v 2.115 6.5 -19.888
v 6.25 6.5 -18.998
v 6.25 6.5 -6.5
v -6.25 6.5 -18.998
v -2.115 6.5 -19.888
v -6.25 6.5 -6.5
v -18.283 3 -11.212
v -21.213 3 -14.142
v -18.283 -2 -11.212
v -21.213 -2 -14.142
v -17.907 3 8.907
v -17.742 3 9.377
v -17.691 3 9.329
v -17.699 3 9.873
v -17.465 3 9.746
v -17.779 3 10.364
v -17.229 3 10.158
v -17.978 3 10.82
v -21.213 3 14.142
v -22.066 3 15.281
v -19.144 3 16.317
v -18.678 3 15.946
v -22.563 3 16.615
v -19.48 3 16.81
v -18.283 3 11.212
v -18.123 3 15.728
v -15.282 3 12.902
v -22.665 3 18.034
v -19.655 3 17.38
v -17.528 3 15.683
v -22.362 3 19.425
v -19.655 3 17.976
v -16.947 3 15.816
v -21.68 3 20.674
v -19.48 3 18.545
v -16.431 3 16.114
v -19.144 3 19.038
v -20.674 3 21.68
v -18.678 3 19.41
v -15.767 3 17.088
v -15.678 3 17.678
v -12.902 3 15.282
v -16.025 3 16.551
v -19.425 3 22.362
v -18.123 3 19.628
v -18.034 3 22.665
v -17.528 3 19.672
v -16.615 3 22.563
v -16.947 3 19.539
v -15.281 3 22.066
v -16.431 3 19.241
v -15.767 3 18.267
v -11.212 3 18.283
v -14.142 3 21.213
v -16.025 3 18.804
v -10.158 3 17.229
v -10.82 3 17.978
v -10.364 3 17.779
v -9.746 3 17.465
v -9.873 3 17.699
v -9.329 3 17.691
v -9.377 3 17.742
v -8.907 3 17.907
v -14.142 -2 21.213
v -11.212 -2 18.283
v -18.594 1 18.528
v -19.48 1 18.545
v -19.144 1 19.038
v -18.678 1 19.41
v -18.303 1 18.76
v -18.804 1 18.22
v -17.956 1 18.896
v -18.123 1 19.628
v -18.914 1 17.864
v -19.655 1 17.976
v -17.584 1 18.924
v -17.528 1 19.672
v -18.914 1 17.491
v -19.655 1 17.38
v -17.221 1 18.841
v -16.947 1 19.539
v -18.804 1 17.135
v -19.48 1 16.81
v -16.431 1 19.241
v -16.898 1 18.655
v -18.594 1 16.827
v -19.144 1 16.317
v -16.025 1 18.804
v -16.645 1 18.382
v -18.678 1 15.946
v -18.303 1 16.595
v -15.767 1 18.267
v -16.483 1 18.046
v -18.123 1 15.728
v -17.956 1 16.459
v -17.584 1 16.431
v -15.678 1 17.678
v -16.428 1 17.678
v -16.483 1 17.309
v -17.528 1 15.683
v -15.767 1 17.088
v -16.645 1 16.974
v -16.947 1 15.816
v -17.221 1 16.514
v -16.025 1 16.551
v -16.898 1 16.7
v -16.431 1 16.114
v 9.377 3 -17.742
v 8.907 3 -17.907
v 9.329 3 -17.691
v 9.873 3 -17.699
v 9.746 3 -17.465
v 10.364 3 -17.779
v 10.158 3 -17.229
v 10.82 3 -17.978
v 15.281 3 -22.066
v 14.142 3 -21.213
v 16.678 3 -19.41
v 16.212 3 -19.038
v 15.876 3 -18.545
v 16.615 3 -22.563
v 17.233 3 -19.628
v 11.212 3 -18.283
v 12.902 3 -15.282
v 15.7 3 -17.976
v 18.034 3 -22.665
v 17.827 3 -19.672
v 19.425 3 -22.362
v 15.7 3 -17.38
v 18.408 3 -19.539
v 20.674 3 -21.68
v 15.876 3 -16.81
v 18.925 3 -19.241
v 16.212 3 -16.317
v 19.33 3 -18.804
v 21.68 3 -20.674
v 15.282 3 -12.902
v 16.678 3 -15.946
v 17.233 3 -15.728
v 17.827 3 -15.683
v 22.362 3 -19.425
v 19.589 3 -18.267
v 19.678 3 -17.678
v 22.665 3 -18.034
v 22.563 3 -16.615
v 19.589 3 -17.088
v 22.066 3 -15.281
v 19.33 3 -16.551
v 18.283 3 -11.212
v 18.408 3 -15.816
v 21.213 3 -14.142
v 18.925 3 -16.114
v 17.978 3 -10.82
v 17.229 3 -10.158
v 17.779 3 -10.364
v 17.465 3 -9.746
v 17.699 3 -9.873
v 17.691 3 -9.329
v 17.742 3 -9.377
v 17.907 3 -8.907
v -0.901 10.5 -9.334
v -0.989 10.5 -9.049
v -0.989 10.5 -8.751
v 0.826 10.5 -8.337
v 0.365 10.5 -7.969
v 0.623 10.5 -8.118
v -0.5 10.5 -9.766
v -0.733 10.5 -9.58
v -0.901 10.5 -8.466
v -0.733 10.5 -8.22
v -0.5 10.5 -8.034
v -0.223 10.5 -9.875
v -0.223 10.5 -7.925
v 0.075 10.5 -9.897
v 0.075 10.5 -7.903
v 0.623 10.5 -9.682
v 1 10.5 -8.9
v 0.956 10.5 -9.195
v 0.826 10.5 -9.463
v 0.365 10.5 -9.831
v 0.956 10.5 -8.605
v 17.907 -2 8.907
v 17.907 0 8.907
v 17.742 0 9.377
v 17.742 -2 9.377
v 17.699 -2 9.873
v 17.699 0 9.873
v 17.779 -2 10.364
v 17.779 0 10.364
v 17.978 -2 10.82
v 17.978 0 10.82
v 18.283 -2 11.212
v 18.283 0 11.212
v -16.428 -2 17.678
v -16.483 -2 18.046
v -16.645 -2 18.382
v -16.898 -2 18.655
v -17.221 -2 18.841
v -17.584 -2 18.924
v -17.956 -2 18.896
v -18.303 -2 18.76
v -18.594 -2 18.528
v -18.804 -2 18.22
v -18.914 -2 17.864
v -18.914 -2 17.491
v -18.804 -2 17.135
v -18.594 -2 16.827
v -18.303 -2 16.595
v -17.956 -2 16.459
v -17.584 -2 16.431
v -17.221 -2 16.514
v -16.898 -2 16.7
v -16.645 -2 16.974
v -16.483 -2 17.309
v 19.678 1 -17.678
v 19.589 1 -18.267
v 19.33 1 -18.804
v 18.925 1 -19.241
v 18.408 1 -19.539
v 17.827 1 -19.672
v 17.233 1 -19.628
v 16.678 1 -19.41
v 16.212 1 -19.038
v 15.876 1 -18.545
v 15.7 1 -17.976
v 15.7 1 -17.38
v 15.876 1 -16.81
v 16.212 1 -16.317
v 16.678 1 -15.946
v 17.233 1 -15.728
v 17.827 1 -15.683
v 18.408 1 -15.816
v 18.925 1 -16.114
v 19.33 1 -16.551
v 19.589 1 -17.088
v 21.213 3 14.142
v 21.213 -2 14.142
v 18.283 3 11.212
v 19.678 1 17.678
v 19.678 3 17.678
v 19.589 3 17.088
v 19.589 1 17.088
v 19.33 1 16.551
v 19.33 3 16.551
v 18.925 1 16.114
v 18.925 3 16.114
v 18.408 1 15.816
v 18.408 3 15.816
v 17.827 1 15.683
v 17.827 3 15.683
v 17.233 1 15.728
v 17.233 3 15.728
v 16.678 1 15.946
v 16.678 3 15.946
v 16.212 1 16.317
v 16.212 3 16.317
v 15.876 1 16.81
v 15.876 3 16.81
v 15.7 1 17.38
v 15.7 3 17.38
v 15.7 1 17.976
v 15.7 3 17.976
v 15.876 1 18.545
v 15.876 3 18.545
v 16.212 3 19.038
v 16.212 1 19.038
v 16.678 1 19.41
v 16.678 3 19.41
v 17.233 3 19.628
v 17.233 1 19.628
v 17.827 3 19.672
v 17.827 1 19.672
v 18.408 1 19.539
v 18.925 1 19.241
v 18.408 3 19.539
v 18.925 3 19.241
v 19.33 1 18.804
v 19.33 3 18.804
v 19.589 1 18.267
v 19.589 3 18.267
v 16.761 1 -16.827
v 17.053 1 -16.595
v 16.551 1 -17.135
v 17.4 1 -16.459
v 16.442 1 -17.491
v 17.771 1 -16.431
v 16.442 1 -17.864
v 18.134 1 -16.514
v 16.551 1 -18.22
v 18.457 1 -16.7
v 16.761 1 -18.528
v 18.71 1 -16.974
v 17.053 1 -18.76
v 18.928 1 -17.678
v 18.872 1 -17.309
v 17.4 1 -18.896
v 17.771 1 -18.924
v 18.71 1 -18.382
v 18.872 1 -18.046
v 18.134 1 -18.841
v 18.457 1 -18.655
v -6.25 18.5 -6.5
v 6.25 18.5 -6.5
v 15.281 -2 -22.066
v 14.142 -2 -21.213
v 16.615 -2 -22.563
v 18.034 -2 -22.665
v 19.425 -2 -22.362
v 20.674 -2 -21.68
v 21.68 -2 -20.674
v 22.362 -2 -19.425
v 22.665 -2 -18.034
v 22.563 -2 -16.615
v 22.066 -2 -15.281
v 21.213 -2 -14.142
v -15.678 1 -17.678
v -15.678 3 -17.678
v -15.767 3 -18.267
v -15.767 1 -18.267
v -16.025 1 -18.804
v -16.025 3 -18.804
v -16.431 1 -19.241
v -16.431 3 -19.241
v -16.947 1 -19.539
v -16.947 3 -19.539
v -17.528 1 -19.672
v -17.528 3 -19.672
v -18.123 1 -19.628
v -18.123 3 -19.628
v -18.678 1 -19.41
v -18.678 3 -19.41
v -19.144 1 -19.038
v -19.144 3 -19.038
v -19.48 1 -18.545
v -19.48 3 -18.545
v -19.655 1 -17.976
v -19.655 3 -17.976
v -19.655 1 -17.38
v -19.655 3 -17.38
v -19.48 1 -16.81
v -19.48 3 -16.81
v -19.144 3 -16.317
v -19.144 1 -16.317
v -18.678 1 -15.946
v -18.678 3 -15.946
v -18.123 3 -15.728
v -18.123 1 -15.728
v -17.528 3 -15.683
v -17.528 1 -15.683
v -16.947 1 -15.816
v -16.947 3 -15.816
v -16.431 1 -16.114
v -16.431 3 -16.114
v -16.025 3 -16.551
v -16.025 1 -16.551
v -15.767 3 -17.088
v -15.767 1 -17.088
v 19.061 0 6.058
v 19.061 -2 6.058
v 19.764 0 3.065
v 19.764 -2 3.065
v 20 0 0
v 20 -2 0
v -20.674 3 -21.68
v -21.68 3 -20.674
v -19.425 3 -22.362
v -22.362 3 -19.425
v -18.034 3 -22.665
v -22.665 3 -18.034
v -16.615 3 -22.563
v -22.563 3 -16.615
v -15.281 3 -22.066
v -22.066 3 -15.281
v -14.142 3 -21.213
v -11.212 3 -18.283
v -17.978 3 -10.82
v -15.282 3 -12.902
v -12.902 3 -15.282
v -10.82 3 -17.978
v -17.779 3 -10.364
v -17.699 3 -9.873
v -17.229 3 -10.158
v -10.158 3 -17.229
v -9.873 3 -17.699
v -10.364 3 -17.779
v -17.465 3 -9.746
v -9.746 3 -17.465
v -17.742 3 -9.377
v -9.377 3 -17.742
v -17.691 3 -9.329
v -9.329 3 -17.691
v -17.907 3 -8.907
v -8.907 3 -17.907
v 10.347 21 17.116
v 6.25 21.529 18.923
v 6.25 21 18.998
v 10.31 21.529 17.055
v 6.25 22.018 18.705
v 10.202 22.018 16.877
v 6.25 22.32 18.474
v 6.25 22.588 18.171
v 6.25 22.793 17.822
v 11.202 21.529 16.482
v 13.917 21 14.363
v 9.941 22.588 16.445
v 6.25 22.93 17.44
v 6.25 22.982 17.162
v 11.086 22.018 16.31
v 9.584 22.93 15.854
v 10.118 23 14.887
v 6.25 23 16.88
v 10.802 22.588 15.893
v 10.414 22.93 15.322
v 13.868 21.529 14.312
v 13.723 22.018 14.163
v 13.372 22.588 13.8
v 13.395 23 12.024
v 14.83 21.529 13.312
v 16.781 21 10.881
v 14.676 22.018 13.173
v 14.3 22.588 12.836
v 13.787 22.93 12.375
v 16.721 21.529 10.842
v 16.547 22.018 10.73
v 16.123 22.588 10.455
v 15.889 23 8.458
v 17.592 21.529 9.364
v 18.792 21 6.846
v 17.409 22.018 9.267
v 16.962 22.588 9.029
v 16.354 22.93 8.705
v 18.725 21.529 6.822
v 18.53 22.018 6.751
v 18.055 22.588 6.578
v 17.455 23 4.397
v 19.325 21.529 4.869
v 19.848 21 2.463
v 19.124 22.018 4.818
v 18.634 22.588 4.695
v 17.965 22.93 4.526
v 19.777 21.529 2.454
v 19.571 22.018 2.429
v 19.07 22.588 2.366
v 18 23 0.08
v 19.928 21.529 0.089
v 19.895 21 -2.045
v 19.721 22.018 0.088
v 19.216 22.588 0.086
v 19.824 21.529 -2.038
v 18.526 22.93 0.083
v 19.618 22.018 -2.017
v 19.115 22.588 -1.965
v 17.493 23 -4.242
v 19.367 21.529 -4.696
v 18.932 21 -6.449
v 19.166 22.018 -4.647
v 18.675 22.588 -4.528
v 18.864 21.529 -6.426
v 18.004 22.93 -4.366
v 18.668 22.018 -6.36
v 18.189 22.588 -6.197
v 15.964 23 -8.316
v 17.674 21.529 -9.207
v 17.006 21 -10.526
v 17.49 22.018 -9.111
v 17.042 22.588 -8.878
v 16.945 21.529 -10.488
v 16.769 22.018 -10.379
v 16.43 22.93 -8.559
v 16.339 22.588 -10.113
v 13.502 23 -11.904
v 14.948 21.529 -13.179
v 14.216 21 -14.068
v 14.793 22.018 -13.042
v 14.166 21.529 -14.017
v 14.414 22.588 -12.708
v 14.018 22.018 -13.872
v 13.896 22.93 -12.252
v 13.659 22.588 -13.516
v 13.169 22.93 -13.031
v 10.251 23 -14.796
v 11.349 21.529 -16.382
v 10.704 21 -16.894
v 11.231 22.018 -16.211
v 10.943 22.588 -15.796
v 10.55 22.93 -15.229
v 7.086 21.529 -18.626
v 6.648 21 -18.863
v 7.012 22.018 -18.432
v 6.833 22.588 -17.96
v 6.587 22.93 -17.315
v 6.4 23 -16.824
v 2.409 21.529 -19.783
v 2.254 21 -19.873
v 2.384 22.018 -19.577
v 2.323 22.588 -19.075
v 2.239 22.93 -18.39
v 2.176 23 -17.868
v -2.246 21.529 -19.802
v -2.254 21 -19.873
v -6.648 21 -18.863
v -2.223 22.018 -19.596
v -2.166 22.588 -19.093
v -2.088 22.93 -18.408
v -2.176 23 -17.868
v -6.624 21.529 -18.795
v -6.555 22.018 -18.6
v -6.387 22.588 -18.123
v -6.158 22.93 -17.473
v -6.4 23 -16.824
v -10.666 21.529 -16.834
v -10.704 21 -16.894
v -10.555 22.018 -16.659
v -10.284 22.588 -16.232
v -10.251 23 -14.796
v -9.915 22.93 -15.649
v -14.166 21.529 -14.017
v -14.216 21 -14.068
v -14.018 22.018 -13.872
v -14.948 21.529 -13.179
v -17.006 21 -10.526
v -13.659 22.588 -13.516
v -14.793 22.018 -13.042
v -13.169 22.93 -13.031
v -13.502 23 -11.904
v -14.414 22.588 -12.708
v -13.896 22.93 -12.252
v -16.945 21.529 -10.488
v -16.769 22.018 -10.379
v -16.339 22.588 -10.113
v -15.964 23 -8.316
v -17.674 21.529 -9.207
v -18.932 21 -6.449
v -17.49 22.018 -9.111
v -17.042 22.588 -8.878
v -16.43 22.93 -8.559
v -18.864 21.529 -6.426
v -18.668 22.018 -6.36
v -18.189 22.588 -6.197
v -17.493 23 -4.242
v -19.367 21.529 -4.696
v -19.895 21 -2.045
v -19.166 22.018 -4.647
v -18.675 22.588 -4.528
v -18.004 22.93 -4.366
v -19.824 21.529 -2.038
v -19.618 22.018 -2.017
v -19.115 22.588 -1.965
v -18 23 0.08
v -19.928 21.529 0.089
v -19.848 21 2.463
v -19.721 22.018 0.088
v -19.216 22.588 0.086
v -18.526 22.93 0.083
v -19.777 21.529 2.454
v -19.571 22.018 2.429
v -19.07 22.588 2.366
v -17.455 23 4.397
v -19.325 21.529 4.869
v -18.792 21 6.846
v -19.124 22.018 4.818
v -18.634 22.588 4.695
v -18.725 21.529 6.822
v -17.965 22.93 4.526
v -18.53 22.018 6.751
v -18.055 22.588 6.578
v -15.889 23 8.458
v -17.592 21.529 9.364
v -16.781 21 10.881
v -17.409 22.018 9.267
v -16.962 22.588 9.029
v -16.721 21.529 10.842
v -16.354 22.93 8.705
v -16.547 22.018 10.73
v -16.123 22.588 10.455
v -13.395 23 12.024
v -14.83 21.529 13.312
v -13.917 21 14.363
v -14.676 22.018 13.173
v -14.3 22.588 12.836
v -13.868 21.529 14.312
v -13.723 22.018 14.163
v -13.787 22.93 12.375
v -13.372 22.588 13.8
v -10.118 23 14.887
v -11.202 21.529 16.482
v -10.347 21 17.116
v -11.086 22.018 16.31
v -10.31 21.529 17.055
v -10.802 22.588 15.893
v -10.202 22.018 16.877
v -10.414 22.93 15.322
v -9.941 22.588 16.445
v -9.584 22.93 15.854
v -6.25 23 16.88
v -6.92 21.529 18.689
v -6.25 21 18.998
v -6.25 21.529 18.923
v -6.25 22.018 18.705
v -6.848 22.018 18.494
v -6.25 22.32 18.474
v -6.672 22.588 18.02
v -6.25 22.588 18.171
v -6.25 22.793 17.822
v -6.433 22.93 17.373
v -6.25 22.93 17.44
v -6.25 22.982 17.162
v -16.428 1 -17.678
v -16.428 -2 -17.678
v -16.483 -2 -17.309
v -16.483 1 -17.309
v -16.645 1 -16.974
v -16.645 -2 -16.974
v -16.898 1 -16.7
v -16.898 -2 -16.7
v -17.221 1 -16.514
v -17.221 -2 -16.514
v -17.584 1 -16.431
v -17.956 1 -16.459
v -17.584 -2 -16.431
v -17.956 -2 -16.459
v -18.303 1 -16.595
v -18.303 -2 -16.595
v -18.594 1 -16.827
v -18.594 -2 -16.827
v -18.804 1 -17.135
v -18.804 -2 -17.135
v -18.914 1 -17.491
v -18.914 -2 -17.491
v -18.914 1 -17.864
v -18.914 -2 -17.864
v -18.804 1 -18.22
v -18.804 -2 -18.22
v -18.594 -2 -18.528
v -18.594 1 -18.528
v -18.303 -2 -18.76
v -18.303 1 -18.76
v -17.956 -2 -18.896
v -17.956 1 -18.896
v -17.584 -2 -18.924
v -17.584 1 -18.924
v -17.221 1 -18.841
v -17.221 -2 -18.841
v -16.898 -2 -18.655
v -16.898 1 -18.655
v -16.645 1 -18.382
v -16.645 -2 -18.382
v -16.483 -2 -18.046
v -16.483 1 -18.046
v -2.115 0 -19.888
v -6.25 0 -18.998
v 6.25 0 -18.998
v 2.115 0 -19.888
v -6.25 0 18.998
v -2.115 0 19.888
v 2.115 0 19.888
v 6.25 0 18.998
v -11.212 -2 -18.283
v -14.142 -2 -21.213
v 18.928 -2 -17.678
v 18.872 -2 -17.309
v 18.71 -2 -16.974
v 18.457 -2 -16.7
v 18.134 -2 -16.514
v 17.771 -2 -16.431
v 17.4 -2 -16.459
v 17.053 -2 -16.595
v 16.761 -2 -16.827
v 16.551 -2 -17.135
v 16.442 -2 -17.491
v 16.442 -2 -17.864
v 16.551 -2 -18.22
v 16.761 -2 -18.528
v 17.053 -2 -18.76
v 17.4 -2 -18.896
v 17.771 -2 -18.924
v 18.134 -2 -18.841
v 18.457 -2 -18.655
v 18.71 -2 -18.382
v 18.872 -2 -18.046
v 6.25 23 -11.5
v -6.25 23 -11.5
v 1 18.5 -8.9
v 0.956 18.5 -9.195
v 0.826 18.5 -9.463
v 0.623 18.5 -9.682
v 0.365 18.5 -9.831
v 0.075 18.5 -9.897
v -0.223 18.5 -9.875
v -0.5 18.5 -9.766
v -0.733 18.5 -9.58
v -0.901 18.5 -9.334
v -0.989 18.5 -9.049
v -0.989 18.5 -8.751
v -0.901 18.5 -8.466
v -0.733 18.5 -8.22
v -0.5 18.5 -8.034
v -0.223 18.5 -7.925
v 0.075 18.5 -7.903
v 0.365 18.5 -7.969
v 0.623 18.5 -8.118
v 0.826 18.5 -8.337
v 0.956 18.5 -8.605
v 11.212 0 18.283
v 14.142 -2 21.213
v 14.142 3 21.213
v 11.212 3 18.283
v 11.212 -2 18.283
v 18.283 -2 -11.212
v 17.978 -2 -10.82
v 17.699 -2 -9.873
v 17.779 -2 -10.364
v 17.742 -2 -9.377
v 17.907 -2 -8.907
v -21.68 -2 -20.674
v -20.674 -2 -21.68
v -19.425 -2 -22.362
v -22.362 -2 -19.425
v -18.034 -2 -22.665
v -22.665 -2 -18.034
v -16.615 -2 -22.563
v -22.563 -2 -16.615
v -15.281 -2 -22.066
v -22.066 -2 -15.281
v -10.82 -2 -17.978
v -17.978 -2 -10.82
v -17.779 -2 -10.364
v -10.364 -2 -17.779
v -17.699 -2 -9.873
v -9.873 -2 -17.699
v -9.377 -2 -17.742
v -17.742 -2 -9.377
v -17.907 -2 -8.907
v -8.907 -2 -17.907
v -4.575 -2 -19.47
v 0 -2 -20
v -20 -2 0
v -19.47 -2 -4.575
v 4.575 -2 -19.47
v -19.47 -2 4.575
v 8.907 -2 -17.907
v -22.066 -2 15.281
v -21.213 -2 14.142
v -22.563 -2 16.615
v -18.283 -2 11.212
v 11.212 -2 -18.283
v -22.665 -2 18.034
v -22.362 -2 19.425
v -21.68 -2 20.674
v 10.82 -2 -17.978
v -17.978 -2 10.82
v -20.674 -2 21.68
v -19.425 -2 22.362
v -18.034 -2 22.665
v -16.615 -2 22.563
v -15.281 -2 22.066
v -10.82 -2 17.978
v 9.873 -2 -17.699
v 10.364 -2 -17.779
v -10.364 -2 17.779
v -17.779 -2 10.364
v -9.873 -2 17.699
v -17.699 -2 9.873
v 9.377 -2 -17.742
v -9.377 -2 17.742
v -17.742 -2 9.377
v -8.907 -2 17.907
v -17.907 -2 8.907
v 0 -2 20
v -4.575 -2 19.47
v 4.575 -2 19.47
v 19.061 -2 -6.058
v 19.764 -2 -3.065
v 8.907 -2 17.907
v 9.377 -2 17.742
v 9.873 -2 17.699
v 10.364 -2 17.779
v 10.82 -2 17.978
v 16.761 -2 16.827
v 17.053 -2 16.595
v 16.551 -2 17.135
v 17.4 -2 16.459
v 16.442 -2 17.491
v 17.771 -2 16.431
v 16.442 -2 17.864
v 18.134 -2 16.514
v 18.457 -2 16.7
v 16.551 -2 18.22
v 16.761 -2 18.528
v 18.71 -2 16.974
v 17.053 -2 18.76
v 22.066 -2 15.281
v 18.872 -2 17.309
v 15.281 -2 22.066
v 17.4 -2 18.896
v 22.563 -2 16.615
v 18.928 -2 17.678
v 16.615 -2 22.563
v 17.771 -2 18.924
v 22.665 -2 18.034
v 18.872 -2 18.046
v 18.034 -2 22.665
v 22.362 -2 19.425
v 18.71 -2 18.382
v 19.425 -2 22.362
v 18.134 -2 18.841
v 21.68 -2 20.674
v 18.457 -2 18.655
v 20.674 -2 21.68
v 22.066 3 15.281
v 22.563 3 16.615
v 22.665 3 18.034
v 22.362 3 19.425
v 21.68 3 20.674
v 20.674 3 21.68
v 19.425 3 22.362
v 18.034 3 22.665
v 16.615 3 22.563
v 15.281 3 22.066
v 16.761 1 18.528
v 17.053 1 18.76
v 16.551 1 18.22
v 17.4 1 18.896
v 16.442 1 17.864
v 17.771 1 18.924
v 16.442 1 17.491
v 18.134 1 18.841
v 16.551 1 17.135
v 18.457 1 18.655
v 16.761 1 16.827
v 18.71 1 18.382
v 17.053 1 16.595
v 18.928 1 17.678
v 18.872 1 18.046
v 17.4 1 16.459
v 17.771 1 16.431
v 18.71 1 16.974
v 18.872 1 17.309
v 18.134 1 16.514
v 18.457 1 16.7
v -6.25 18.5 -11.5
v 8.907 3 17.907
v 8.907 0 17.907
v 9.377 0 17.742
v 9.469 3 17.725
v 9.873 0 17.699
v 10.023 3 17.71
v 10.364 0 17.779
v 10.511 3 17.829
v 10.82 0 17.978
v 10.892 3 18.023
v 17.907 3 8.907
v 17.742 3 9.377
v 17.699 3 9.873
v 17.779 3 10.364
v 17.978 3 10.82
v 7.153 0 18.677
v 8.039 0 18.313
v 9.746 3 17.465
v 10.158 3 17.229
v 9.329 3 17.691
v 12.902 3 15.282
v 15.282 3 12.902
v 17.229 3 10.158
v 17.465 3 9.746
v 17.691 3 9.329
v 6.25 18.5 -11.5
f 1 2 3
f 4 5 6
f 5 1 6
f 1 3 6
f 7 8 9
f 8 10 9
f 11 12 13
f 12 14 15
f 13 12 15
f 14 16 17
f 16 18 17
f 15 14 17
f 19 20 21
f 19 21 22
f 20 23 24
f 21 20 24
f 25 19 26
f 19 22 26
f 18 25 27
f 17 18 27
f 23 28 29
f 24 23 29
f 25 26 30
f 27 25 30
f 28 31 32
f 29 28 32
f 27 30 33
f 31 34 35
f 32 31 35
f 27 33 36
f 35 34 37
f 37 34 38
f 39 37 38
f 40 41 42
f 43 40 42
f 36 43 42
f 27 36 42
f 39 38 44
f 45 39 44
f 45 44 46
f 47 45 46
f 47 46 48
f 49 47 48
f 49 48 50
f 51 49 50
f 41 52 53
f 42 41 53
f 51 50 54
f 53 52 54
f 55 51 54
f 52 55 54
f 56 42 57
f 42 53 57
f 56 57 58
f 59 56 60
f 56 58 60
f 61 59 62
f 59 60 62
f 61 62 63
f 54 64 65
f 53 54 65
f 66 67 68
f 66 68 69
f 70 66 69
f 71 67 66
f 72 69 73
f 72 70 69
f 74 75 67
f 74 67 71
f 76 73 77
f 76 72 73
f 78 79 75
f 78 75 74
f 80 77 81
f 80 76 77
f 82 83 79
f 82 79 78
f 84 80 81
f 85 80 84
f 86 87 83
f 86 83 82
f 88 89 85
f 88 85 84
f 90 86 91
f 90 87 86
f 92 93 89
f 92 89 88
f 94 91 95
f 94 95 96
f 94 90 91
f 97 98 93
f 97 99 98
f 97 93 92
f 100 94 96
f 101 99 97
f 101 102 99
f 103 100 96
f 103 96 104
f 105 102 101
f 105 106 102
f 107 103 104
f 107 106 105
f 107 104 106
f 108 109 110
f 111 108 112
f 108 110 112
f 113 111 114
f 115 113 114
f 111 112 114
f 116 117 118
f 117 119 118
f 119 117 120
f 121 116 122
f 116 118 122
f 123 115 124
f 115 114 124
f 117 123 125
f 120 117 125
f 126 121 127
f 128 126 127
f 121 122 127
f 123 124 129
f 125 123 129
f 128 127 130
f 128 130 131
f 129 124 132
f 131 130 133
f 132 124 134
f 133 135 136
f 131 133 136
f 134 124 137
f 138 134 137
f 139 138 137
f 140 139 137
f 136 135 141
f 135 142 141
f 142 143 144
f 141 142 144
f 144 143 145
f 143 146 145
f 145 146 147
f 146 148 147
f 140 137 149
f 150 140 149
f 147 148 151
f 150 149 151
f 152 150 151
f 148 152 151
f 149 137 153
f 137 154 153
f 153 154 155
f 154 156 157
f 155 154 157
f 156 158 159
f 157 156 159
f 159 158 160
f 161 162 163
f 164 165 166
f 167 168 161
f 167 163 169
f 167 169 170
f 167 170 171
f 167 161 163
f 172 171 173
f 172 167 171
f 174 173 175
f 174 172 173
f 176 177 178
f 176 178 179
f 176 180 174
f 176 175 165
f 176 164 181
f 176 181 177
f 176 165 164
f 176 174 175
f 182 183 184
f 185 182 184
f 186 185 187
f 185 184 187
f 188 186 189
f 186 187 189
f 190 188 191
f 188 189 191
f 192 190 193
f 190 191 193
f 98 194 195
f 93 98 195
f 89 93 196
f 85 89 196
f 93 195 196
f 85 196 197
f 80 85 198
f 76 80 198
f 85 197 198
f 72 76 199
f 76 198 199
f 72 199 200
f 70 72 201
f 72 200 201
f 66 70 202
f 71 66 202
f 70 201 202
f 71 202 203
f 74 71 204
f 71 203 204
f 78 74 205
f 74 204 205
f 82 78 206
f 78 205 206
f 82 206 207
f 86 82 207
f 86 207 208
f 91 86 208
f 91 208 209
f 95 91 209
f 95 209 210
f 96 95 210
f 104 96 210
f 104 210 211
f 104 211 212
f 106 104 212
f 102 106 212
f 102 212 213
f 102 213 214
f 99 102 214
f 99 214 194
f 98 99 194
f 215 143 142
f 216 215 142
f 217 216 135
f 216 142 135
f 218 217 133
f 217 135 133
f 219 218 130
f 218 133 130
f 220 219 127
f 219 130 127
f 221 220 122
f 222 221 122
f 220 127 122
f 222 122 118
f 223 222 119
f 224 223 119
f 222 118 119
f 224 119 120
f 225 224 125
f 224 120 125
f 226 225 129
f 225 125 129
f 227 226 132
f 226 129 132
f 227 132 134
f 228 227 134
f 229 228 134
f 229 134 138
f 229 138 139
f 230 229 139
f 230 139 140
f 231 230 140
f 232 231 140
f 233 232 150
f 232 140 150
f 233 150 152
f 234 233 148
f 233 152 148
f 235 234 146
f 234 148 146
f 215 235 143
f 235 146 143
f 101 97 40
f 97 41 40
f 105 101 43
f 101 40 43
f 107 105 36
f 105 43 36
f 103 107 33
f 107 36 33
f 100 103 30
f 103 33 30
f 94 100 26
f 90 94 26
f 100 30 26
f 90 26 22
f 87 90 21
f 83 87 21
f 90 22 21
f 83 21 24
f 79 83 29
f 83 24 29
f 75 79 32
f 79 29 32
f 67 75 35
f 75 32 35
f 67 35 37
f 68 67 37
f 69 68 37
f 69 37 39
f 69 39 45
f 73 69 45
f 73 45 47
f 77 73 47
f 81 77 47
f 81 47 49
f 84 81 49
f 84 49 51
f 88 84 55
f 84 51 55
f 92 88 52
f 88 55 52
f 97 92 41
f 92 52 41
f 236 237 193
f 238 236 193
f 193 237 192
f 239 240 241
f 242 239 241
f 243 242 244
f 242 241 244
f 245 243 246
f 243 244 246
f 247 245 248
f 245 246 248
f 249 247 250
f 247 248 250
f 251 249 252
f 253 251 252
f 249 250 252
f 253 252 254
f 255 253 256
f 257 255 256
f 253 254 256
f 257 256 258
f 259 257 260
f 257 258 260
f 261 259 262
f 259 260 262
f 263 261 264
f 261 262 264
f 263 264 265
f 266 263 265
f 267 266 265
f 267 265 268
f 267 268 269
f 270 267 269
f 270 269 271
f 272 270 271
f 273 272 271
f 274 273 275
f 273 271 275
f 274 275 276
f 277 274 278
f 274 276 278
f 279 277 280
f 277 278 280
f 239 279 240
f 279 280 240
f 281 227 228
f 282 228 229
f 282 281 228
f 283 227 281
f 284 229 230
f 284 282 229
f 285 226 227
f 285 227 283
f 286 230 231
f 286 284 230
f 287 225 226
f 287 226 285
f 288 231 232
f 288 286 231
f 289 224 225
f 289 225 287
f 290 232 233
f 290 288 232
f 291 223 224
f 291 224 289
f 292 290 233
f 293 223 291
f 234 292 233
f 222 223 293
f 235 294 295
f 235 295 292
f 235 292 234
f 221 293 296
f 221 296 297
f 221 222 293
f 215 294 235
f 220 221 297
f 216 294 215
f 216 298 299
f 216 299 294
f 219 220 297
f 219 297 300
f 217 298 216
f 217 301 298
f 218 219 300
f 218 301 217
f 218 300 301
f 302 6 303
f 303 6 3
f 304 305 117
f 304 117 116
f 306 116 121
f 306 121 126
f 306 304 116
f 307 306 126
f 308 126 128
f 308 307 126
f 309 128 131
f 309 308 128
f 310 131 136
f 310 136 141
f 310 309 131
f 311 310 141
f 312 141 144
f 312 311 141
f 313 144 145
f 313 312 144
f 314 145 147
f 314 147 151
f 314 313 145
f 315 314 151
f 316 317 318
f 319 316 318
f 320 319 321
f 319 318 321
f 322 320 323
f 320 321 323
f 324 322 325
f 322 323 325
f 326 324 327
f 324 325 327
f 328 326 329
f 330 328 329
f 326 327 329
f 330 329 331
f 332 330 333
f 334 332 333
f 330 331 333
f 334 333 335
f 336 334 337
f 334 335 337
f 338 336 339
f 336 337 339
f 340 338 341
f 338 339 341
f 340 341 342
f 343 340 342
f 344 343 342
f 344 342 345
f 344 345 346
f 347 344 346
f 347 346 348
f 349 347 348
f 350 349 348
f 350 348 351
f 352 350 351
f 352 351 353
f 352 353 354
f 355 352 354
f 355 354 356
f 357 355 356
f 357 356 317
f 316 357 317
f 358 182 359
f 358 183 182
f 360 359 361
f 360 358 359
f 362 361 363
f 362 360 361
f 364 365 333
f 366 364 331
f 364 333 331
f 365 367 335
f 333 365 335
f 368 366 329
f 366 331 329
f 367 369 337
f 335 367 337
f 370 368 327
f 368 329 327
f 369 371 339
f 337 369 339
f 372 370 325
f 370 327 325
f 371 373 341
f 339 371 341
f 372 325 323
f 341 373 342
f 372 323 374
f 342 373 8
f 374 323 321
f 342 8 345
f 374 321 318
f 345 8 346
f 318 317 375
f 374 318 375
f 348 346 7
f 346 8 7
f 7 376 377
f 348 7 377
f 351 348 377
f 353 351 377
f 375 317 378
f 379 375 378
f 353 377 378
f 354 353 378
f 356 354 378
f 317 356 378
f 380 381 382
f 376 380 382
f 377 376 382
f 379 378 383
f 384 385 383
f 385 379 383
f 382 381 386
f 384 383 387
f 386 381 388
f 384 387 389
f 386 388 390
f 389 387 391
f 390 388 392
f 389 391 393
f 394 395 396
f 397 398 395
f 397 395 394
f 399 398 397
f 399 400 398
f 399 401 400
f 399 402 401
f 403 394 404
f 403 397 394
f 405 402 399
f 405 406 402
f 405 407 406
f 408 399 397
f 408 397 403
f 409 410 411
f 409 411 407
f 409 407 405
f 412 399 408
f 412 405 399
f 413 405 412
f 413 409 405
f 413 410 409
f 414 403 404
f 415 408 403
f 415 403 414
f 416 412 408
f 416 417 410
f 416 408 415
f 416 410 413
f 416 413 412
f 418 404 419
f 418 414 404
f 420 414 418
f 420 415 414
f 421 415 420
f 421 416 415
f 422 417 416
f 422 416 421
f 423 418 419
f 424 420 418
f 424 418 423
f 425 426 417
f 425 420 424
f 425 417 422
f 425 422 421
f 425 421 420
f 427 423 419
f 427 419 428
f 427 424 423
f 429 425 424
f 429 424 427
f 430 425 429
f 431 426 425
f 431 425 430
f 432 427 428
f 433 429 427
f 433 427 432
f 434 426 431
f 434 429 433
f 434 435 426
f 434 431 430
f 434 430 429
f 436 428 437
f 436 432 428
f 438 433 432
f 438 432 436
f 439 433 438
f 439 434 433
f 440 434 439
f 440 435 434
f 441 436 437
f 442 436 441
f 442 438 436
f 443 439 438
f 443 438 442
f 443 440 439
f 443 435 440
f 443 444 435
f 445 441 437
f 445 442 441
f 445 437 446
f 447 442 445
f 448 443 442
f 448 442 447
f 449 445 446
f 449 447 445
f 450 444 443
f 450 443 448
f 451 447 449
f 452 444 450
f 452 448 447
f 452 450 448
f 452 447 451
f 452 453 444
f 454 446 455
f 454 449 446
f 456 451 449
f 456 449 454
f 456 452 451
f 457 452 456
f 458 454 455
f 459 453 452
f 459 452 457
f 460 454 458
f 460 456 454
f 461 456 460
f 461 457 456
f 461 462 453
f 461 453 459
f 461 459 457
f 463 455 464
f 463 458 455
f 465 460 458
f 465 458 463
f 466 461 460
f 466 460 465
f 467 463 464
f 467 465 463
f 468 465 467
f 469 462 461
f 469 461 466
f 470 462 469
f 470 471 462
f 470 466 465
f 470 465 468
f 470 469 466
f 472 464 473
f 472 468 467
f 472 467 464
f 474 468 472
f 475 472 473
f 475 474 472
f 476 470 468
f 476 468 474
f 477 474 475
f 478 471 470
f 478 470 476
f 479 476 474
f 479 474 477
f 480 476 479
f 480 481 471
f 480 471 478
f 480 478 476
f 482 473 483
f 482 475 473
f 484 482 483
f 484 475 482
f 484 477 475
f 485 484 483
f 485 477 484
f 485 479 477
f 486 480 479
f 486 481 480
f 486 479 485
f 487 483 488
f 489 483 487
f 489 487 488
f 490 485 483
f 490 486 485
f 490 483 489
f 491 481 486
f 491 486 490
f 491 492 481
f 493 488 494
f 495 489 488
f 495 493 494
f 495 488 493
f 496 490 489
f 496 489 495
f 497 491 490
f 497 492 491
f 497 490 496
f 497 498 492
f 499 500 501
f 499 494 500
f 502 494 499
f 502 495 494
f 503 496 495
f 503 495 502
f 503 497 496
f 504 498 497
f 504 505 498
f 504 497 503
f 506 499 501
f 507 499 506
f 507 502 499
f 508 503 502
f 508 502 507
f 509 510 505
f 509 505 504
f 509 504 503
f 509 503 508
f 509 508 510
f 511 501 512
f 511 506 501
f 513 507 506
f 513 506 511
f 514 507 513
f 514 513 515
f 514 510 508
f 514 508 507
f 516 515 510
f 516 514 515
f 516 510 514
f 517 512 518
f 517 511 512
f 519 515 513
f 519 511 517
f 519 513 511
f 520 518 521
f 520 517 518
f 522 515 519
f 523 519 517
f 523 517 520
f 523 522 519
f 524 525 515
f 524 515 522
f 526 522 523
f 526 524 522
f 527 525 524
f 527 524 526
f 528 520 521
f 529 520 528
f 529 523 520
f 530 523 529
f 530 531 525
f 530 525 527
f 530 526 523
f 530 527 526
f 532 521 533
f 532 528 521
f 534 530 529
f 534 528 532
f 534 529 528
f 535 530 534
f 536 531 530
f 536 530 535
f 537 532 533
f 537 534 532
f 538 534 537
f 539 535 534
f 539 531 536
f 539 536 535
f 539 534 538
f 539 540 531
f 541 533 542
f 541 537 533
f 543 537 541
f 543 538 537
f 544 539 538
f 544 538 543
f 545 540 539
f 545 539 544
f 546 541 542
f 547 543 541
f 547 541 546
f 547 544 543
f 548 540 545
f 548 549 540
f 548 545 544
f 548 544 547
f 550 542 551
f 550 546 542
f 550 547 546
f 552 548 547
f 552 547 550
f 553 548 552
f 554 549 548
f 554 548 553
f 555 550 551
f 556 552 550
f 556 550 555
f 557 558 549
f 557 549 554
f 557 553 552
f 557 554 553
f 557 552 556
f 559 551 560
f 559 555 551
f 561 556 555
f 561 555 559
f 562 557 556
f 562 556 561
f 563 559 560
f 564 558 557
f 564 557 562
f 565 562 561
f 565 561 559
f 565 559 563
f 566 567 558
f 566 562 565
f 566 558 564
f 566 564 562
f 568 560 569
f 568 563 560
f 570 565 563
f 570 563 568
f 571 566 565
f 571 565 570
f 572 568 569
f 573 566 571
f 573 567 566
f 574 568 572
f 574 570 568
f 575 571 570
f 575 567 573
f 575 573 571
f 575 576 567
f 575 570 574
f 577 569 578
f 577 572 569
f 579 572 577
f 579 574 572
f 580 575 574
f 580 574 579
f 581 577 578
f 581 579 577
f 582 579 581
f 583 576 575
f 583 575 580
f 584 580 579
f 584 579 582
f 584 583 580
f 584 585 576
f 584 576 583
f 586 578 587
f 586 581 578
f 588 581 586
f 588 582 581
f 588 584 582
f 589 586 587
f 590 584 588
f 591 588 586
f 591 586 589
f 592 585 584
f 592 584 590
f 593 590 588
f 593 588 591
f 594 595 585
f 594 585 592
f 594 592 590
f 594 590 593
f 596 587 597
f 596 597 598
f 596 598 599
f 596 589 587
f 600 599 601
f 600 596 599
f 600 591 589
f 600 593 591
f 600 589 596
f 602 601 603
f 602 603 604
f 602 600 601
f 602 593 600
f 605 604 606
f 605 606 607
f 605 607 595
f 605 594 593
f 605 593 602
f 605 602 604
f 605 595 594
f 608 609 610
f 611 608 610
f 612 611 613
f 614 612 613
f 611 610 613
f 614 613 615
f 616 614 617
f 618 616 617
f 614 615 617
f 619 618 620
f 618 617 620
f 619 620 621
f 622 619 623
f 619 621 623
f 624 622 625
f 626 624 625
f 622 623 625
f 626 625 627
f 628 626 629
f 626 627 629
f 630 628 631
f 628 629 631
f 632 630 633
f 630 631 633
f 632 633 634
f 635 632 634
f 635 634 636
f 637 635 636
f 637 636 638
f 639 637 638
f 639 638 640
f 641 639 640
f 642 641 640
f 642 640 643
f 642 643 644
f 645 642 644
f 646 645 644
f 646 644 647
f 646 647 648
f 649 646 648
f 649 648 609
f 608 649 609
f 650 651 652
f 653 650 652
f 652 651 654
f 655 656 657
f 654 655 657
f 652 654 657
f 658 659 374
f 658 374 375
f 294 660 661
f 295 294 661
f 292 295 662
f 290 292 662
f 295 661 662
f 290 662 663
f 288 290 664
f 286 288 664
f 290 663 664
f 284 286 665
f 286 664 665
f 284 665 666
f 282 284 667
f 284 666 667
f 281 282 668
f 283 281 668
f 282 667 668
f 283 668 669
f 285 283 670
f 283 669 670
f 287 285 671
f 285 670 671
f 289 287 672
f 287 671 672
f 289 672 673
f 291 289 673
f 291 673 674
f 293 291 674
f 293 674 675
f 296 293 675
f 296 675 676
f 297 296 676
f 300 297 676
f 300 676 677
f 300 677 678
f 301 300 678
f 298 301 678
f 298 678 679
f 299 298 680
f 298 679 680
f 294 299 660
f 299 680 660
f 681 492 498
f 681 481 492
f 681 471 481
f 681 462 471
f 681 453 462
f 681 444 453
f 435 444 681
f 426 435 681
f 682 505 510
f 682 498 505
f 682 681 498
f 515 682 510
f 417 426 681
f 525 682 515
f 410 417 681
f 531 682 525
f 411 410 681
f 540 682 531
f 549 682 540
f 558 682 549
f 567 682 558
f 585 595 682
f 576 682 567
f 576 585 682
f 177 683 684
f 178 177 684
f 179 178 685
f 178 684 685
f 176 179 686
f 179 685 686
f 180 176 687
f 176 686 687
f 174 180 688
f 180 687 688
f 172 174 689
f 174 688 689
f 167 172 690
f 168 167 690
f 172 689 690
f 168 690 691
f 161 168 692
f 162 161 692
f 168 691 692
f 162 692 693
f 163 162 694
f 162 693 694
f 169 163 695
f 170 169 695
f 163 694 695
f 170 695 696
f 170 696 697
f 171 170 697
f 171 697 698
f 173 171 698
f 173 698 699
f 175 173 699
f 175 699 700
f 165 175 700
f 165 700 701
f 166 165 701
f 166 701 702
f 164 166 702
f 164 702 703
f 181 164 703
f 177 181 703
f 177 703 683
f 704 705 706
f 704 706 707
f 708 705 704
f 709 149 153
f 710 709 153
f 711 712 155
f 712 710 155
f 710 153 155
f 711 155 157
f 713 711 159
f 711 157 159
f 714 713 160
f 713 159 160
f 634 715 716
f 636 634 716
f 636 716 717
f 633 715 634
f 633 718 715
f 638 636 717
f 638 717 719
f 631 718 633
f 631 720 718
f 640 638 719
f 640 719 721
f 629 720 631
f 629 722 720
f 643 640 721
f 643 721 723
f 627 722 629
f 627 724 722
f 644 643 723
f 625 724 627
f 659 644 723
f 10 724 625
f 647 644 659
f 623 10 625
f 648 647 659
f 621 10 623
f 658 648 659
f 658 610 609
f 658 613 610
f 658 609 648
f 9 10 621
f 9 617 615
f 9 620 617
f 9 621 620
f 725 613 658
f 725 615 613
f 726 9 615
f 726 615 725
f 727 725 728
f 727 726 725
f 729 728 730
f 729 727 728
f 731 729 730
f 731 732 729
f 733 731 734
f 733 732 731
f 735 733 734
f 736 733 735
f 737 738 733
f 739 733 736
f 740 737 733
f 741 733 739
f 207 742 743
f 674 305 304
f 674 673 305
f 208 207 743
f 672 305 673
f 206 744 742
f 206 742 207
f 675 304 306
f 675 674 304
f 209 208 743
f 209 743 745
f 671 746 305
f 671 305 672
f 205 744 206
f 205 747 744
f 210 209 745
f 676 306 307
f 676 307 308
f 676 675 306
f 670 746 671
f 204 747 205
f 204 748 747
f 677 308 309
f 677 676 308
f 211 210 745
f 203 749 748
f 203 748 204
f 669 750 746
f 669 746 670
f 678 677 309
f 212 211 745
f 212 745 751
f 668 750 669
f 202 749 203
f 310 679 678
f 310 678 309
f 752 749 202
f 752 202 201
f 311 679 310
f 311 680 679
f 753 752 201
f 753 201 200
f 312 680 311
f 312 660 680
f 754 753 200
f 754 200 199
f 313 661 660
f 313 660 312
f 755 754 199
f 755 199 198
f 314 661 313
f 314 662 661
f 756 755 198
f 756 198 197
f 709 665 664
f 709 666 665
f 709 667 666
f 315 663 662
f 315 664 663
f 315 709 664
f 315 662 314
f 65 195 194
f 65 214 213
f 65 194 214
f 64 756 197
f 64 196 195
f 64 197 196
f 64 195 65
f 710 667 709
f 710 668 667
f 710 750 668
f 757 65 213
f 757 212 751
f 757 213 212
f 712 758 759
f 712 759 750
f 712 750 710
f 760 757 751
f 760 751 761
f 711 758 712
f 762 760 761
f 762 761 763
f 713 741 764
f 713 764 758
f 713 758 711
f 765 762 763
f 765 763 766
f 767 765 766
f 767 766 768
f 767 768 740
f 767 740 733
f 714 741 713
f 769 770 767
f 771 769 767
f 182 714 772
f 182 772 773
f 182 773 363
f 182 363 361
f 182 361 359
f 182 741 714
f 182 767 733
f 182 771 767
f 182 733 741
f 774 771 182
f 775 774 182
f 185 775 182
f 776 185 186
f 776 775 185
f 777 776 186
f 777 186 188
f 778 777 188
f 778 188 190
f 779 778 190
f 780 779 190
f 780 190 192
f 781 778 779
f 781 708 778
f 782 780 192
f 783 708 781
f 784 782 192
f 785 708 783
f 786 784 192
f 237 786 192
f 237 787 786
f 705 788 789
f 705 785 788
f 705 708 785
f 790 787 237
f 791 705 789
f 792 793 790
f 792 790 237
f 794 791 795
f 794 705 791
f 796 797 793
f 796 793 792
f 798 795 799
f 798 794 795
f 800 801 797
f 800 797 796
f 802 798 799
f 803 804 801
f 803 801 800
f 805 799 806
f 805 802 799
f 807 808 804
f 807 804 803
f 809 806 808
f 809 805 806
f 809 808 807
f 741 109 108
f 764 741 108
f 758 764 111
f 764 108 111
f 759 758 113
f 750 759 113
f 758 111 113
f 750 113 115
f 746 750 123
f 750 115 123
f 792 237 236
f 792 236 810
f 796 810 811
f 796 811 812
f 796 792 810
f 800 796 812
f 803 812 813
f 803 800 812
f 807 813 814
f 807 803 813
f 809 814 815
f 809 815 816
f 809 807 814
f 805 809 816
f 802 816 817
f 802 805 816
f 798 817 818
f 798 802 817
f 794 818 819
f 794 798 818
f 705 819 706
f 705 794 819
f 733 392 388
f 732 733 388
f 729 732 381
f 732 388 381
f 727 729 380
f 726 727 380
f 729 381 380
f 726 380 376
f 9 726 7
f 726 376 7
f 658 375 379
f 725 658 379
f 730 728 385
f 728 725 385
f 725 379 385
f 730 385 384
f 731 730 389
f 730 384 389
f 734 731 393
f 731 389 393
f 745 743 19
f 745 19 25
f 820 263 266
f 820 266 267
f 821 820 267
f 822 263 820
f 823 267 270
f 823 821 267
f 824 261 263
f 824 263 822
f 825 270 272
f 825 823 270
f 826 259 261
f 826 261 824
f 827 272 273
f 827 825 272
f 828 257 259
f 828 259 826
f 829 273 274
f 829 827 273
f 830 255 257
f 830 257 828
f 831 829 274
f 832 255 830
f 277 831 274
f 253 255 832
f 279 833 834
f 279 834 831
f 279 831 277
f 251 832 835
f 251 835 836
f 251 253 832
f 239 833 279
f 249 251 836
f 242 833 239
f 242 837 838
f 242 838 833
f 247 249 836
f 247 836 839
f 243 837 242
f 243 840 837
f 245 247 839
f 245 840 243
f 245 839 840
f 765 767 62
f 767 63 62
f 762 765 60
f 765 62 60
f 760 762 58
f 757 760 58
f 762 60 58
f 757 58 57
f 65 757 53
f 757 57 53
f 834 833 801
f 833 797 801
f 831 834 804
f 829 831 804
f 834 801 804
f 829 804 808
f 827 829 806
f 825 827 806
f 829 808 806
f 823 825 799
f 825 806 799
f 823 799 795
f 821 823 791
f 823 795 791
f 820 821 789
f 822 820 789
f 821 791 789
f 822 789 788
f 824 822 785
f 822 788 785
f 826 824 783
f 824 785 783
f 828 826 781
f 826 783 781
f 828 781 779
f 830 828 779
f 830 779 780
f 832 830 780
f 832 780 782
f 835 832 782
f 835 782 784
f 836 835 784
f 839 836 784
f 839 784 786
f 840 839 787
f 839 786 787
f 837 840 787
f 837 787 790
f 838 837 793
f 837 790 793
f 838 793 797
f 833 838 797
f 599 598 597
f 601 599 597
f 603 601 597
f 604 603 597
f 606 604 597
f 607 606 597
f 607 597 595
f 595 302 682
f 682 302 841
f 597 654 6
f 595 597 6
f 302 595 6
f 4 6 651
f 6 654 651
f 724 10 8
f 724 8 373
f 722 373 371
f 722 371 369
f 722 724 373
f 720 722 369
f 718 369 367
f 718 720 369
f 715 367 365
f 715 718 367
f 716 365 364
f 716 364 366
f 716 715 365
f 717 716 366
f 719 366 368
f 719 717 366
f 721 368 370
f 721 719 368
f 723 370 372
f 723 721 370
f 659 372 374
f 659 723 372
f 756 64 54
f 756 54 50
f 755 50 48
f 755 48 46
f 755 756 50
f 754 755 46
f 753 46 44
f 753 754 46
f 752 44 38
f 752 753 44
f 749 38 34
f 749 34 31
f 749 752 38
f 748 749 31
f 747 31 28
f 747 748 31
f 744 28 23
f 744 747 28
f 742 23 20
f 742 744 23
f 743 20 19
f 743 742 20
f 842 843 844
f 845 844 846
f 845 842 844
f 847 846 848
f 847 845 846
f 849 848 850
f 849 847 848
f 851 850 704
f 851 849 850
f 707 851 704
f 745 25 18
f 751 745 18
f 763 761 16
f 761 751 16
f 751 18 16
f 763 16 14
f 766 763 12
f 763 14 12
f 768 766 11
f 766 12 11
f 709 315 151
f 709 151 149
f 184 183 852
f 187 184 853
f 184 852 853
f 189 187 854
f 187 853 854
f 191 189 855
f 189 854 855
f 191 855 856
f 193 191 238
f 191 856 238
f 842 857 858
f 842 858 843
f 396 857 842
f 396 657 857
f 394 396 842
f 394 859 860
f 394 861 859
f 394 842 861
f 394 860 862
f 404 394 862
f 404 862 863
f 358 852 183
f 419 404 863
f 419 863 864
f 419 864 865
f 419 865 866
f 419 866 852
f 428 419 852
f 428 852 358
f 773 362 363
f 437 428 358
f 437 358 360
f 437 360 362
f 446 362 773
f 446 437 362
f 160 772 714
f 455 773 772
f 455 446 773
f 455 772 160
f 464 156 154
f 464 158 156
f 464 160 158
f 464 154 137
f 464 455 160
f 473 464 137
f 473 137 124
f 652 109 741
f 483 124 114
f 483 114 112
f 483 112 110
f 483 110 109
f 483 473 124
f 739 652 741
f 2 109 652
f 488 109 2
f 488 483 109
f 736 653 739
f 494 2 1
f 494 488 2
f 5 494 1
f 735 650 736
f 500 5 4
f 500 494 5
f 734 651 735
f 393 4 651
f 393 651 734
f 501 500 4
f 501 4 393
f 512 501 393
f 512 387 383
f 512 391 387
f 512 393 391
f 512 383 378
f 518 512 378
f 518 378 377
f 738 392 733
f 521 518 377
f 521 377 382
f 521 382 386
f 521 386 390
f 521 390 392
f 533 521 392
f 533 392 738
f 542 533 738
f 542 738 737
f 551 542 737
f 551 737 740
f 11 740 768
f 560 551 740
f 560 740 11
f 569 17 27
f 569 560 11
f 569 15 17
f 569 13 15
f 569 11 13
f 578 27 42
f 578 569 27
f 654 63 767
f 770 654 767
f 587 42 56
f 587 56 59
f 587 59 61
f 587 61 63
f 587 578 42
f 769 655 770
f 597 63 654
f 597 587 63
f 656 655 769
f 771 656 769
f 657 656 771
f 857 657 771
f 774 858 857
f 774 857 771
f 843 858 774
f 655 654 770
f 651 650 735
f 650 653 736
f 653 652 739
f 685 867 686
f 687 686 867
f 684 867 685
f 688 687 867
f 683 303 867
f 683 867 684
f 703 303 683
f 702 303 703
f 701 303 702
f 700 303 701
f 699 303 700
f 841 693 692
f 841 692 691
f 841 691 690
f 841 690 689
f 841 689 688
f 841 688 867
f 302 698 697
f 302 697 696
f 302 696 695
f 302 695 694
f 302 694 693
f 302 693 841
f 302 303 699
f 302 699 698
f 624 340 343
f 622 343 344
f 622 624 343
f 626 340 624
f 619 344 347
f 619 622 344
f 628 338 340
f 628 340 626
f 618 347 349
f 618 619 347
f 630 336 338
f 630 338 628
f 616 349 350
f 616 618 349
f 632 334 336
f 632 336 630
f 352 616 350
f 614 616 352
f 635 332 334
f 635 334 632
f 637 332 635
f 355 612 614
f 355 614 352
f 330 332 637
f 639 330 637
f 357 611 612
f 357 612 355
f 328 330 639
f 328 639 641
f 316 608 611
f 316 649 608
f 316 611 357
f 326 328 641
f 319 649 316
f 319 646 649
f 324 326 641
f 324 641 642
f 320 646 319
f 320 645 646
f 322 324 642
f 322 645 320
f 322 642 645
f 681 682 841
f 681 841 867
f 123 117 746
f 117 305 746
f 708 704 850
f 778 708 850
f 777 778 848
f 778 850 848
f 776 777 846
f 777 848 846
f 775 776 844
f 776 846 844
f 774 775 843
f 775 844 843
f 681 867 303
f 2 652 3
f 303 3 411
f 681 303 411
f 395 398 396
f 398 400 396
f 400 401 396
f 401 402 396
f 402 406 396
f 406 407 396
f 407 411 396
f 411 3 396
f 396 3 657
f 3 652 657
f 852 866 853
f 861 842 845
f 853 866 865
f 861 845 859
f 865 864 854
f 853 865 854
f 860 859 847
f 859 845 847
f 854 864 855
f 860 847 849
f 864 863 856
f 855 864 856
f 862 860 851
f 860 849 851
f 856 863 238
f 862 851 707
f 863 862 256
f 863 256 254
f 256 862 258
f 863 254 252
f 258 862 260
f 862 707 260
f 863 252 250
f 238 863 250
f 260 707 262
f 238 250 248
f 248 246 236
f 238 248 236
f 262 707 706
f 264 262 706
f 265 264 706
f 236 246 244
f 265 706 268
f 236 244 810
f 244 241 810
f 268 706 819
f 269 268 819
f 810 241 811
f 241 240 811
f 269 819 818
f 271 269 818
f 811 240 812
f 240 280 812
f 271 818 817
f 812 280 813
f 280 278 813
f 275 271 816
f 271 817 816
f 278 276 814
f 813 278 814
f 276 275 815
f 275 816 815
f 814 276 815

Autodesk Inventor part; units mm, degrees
ref_plane "YZ Plane" through (0, 0, 0) normal (1, 0, 0) x (0, 1, 0)
ref_plane "XZ Plane" through (0, 0, 0) normal (0, 1, 0) x (-1, 0, 0)
ref_plane "XY Plane" through (0, 0, 0) normal (0, 0, 1) x (1, 0, 0)
sketch "Sketch2" plane through (0, 0, 0) normal (0, 1, 0) x (-1, 0, 0)
  circle A0 centre (0, 0) radius 20
  line L0 (6.25, -6.5) -> (-6.25, -6.5)
  line L1 (-6.25, -6.5) -> (-6.25, 22.6664)
  line L2 (-6.25, 22.6664) -> (6.25, 22.6664)
  line L3 (6.25, 22.6664) -> (6.25, -6.5)
  line L4 (0, -28.5333) -> (0, 31.1997) projected
  line L5 (28, 0) -> (-28, 0) projected
  point P0 (0, -6.5)
  point P1 (6.25, 18.9984)
  point P2 (-6.25, 18.9984)
  dimension "d5" = 40
  dimension "d6" = 6.5
  dimension "d7" = 12.5
extrude "Extrusion1" add sketch "Sketch2" along normal blind 23 contours L5 L3 A0 | A0 L4 L0 L3 L5 | A0 L5 L1 L0 L4 | A0 L1 L5
sketch "Sketch3" plane through (-6.25, 0, -6.5) normal (0, 0, 1) x (1, 0, 0)
  line L0 (0, 23) -> (12.5, 23) projected
  line L1 (0, 23) -> (12.5, 23)
  line L2 (12.5, 23) -> (12.5, 18.5)
  line L3 (12.5, 18.5) -> (0, 18.5)
  line L4 (0, 18.5) -> (0, 23)
  point P0 (0, 0)
  dimension "d10" = 4.5
extrude "Extrusion2" cut sketch "Sketch3" against normal blind 5
sketch "Sketch4" plane through (-6.25, 0, -6.5) normal (0, 0, 1) x (1, 0, 0)
  line L0 (0, 23) -> (12.5, 23)
  line L1 (12.5, 23) -> (12.5, 18.5)
  line L2 (12.5, 18.5) -> (0, 18.5)
  line L3 (0, 18.5) -> (0, 23)
  line L4 (0, 0) -> (10.5075, 0)
  line L5 (0, 0) -> (12.5, 0)
  line L6 (12.5, 0) -> (12.5, 6.5)
  line L7 (12.5, 6.5) -> (0, 6.5)
  line L8 (0, 6.5) -> (0, 0)
  point P0 (6.25, 0)
  point P1 (6.25, 0)
  dimension "d16" = 12
extrude "Extrusion3" cut sketch "Sketch4" against normal up to surface contours L8 L7 L6 L5 L4
sketch "Sketch5" plane through (-6.25, 18.5, -6.5) normal (0, 1, 0) x (1, 0, 0)
  line L0 (12.5, -25.4984) -> (12.5, 12.4984) projected
  line L1 (0, 0) -> (0, 12.4984) projected
  line L2 (0, 0) -> (6.25, 0)
  line L3 (6.25, 0) -> (6.25, 2.4)
  line L4 (6.25, 2.4) -> (0, 2.4)
  line L5 (0, 2.4) -> (0, 0)
  line L6 (12.5, 0) -> (0, 0) projected
  circle A0 centre (6.25, 2.4) radius 1
  point P0 (6.25, -6.5)
  point P1 (12.6412, 0)
  point P2 (12.5, 12.4984)
  dimension "d20" = 2.4
  dimension "d21" = 2
extrude "Extrusion4" cut sketch "Sketch5" against normal blind 8 contours A0 L3 L4 | L4 L3 A0
sketch "Sketch6" plane through (0, 0, 0) normal (0, -1, 0) x (1, 0, 0)
  circle A0 centre (0, 0) radius 20
extrude "Extrusion5" add sketch "Sketch6" along normal blind 2
sketch "Sketch9" plane through (0, -2, 0) normal (0, -1, 0) x (1, 0, 0)
  line L0 (0, 0) -> (17.6777, 17.6777) construction
  line L1 (0, 0) -> (25, 0) construction
  circle A0 centre (17.6777, 17.6777) radius 1.25
  line L2 (17.6777, 17.6777) -> (21.2132, 14.1421) construction
  arc A1 (21.2132, 14.1421) -> (14.1421, 21.2132) centre (17.6777, 17.6777) ccw
  circle A2 centre (0, 0) radius 20 projected
  line L3 (0, -34.6482) -> (0, 34.6482) projected
  line L4 (-34.6985, 0) -> (34.9497, 0) projected
  line L5 (14.1421, 21.2132) -> (10.1575, 17.2286)
  arc A3 (-6.25, 18.9984) -> (6.25, 18.9984) centre (0, 0) ccw projected
  line L6 (21.2132, 14.1421) -> (17.2286, 10.1575)
  line L7 (-14.1421, 21.2132) -> (-10.1575, 17.2286)
  arc A4 (-14.1421, 21.2132) -> (-21.2132, 14.1421) centre (-17.6777, 17.6777) ccw
  line L8 (-21.2132, 14.1421) -> (-17.2286, 10.1575)
  circle A5 centre (-17.6777, 17.6777) radius 1.25
  line L9 (-21.2132, -14.1421) -> (-17.2286, -10.1575)
  arc A6 (-21.2132, -14.1421) -> (-14.1421, -21.2132) centre (-17.6777, -17.6777) ccw
  line L10 (-14.1421, -21.2132) -> (-10.1575, -17.2286)
  circle A7 centre (-17.6777, -17.6777) radius 1.25
  line L11 (14.1421, -21.2132) -> (10.1575, -17.2286)
  arc A8 (14.1421, -21.2132) -> (21.2132, -14.1421) centre (17.6777, -17.6777) ccw
  line L12 (21.2132, -14.1421) -> (17.2286, -10.1575)
  circle A9 centre (17.6777, -17.6777) radius 1.25
  dimension "d56" = 25
  dimension "d57" = 45
  dimension "d58" = 2.5
  dimension "d59" = 5
  dimension "d62" = 360
extrude "Extrusion8" add sketch "Sketch9" against normal blind 5 contours L6 A2 L5 A1 | L12 A8 L11 A2 | L10 A6 L9 A2 | L8 A4 L7 A2
sketch "Sketch11" plane through (0, 3, 0) normal (0, 1, 0) x (1, 0, 0)
  circle A0 centre (17.6777, -17.6777) radius 1.25 projected
  circle A1 centre (17.6777, -17.6777) radius 2
  circle A2 centre (17.6777, 17.6777) radius 2
  circle A3 centre (-17.6777, 17.6777) radius 2
  circle A4 centre (-17.6777, -17.6777) radius 2
  point P0 (0, 0)
  dimension "d66" = 4
  dimension "d69" = 360
extrude "Extrusion9" cut sketch "Sketch11" against normal blind 2 contours A0 | A1 | A2 | A3 | A4
fillet "Fillet3" radius 2 1 edges at (0, 23, -20)
fillet "Fillet4" radius 2 10 edges at (-10.1575, 0.5, 17.2286) (10.1575, 1.5, 17.2286) (10.1575, -1, 17.2286) (-17.2286, 0.5, 10.1575) (-17.2286, 0.5, -10.1575) (-10.1575, 0.5, -17.2286) (10.1575, 0.5, -17.2286) (17.2286, 0.5, -10.1575) (17.2286, 1.5, 10.1575) (17.2286, -1, 10.1575)
properties part number "base1"
